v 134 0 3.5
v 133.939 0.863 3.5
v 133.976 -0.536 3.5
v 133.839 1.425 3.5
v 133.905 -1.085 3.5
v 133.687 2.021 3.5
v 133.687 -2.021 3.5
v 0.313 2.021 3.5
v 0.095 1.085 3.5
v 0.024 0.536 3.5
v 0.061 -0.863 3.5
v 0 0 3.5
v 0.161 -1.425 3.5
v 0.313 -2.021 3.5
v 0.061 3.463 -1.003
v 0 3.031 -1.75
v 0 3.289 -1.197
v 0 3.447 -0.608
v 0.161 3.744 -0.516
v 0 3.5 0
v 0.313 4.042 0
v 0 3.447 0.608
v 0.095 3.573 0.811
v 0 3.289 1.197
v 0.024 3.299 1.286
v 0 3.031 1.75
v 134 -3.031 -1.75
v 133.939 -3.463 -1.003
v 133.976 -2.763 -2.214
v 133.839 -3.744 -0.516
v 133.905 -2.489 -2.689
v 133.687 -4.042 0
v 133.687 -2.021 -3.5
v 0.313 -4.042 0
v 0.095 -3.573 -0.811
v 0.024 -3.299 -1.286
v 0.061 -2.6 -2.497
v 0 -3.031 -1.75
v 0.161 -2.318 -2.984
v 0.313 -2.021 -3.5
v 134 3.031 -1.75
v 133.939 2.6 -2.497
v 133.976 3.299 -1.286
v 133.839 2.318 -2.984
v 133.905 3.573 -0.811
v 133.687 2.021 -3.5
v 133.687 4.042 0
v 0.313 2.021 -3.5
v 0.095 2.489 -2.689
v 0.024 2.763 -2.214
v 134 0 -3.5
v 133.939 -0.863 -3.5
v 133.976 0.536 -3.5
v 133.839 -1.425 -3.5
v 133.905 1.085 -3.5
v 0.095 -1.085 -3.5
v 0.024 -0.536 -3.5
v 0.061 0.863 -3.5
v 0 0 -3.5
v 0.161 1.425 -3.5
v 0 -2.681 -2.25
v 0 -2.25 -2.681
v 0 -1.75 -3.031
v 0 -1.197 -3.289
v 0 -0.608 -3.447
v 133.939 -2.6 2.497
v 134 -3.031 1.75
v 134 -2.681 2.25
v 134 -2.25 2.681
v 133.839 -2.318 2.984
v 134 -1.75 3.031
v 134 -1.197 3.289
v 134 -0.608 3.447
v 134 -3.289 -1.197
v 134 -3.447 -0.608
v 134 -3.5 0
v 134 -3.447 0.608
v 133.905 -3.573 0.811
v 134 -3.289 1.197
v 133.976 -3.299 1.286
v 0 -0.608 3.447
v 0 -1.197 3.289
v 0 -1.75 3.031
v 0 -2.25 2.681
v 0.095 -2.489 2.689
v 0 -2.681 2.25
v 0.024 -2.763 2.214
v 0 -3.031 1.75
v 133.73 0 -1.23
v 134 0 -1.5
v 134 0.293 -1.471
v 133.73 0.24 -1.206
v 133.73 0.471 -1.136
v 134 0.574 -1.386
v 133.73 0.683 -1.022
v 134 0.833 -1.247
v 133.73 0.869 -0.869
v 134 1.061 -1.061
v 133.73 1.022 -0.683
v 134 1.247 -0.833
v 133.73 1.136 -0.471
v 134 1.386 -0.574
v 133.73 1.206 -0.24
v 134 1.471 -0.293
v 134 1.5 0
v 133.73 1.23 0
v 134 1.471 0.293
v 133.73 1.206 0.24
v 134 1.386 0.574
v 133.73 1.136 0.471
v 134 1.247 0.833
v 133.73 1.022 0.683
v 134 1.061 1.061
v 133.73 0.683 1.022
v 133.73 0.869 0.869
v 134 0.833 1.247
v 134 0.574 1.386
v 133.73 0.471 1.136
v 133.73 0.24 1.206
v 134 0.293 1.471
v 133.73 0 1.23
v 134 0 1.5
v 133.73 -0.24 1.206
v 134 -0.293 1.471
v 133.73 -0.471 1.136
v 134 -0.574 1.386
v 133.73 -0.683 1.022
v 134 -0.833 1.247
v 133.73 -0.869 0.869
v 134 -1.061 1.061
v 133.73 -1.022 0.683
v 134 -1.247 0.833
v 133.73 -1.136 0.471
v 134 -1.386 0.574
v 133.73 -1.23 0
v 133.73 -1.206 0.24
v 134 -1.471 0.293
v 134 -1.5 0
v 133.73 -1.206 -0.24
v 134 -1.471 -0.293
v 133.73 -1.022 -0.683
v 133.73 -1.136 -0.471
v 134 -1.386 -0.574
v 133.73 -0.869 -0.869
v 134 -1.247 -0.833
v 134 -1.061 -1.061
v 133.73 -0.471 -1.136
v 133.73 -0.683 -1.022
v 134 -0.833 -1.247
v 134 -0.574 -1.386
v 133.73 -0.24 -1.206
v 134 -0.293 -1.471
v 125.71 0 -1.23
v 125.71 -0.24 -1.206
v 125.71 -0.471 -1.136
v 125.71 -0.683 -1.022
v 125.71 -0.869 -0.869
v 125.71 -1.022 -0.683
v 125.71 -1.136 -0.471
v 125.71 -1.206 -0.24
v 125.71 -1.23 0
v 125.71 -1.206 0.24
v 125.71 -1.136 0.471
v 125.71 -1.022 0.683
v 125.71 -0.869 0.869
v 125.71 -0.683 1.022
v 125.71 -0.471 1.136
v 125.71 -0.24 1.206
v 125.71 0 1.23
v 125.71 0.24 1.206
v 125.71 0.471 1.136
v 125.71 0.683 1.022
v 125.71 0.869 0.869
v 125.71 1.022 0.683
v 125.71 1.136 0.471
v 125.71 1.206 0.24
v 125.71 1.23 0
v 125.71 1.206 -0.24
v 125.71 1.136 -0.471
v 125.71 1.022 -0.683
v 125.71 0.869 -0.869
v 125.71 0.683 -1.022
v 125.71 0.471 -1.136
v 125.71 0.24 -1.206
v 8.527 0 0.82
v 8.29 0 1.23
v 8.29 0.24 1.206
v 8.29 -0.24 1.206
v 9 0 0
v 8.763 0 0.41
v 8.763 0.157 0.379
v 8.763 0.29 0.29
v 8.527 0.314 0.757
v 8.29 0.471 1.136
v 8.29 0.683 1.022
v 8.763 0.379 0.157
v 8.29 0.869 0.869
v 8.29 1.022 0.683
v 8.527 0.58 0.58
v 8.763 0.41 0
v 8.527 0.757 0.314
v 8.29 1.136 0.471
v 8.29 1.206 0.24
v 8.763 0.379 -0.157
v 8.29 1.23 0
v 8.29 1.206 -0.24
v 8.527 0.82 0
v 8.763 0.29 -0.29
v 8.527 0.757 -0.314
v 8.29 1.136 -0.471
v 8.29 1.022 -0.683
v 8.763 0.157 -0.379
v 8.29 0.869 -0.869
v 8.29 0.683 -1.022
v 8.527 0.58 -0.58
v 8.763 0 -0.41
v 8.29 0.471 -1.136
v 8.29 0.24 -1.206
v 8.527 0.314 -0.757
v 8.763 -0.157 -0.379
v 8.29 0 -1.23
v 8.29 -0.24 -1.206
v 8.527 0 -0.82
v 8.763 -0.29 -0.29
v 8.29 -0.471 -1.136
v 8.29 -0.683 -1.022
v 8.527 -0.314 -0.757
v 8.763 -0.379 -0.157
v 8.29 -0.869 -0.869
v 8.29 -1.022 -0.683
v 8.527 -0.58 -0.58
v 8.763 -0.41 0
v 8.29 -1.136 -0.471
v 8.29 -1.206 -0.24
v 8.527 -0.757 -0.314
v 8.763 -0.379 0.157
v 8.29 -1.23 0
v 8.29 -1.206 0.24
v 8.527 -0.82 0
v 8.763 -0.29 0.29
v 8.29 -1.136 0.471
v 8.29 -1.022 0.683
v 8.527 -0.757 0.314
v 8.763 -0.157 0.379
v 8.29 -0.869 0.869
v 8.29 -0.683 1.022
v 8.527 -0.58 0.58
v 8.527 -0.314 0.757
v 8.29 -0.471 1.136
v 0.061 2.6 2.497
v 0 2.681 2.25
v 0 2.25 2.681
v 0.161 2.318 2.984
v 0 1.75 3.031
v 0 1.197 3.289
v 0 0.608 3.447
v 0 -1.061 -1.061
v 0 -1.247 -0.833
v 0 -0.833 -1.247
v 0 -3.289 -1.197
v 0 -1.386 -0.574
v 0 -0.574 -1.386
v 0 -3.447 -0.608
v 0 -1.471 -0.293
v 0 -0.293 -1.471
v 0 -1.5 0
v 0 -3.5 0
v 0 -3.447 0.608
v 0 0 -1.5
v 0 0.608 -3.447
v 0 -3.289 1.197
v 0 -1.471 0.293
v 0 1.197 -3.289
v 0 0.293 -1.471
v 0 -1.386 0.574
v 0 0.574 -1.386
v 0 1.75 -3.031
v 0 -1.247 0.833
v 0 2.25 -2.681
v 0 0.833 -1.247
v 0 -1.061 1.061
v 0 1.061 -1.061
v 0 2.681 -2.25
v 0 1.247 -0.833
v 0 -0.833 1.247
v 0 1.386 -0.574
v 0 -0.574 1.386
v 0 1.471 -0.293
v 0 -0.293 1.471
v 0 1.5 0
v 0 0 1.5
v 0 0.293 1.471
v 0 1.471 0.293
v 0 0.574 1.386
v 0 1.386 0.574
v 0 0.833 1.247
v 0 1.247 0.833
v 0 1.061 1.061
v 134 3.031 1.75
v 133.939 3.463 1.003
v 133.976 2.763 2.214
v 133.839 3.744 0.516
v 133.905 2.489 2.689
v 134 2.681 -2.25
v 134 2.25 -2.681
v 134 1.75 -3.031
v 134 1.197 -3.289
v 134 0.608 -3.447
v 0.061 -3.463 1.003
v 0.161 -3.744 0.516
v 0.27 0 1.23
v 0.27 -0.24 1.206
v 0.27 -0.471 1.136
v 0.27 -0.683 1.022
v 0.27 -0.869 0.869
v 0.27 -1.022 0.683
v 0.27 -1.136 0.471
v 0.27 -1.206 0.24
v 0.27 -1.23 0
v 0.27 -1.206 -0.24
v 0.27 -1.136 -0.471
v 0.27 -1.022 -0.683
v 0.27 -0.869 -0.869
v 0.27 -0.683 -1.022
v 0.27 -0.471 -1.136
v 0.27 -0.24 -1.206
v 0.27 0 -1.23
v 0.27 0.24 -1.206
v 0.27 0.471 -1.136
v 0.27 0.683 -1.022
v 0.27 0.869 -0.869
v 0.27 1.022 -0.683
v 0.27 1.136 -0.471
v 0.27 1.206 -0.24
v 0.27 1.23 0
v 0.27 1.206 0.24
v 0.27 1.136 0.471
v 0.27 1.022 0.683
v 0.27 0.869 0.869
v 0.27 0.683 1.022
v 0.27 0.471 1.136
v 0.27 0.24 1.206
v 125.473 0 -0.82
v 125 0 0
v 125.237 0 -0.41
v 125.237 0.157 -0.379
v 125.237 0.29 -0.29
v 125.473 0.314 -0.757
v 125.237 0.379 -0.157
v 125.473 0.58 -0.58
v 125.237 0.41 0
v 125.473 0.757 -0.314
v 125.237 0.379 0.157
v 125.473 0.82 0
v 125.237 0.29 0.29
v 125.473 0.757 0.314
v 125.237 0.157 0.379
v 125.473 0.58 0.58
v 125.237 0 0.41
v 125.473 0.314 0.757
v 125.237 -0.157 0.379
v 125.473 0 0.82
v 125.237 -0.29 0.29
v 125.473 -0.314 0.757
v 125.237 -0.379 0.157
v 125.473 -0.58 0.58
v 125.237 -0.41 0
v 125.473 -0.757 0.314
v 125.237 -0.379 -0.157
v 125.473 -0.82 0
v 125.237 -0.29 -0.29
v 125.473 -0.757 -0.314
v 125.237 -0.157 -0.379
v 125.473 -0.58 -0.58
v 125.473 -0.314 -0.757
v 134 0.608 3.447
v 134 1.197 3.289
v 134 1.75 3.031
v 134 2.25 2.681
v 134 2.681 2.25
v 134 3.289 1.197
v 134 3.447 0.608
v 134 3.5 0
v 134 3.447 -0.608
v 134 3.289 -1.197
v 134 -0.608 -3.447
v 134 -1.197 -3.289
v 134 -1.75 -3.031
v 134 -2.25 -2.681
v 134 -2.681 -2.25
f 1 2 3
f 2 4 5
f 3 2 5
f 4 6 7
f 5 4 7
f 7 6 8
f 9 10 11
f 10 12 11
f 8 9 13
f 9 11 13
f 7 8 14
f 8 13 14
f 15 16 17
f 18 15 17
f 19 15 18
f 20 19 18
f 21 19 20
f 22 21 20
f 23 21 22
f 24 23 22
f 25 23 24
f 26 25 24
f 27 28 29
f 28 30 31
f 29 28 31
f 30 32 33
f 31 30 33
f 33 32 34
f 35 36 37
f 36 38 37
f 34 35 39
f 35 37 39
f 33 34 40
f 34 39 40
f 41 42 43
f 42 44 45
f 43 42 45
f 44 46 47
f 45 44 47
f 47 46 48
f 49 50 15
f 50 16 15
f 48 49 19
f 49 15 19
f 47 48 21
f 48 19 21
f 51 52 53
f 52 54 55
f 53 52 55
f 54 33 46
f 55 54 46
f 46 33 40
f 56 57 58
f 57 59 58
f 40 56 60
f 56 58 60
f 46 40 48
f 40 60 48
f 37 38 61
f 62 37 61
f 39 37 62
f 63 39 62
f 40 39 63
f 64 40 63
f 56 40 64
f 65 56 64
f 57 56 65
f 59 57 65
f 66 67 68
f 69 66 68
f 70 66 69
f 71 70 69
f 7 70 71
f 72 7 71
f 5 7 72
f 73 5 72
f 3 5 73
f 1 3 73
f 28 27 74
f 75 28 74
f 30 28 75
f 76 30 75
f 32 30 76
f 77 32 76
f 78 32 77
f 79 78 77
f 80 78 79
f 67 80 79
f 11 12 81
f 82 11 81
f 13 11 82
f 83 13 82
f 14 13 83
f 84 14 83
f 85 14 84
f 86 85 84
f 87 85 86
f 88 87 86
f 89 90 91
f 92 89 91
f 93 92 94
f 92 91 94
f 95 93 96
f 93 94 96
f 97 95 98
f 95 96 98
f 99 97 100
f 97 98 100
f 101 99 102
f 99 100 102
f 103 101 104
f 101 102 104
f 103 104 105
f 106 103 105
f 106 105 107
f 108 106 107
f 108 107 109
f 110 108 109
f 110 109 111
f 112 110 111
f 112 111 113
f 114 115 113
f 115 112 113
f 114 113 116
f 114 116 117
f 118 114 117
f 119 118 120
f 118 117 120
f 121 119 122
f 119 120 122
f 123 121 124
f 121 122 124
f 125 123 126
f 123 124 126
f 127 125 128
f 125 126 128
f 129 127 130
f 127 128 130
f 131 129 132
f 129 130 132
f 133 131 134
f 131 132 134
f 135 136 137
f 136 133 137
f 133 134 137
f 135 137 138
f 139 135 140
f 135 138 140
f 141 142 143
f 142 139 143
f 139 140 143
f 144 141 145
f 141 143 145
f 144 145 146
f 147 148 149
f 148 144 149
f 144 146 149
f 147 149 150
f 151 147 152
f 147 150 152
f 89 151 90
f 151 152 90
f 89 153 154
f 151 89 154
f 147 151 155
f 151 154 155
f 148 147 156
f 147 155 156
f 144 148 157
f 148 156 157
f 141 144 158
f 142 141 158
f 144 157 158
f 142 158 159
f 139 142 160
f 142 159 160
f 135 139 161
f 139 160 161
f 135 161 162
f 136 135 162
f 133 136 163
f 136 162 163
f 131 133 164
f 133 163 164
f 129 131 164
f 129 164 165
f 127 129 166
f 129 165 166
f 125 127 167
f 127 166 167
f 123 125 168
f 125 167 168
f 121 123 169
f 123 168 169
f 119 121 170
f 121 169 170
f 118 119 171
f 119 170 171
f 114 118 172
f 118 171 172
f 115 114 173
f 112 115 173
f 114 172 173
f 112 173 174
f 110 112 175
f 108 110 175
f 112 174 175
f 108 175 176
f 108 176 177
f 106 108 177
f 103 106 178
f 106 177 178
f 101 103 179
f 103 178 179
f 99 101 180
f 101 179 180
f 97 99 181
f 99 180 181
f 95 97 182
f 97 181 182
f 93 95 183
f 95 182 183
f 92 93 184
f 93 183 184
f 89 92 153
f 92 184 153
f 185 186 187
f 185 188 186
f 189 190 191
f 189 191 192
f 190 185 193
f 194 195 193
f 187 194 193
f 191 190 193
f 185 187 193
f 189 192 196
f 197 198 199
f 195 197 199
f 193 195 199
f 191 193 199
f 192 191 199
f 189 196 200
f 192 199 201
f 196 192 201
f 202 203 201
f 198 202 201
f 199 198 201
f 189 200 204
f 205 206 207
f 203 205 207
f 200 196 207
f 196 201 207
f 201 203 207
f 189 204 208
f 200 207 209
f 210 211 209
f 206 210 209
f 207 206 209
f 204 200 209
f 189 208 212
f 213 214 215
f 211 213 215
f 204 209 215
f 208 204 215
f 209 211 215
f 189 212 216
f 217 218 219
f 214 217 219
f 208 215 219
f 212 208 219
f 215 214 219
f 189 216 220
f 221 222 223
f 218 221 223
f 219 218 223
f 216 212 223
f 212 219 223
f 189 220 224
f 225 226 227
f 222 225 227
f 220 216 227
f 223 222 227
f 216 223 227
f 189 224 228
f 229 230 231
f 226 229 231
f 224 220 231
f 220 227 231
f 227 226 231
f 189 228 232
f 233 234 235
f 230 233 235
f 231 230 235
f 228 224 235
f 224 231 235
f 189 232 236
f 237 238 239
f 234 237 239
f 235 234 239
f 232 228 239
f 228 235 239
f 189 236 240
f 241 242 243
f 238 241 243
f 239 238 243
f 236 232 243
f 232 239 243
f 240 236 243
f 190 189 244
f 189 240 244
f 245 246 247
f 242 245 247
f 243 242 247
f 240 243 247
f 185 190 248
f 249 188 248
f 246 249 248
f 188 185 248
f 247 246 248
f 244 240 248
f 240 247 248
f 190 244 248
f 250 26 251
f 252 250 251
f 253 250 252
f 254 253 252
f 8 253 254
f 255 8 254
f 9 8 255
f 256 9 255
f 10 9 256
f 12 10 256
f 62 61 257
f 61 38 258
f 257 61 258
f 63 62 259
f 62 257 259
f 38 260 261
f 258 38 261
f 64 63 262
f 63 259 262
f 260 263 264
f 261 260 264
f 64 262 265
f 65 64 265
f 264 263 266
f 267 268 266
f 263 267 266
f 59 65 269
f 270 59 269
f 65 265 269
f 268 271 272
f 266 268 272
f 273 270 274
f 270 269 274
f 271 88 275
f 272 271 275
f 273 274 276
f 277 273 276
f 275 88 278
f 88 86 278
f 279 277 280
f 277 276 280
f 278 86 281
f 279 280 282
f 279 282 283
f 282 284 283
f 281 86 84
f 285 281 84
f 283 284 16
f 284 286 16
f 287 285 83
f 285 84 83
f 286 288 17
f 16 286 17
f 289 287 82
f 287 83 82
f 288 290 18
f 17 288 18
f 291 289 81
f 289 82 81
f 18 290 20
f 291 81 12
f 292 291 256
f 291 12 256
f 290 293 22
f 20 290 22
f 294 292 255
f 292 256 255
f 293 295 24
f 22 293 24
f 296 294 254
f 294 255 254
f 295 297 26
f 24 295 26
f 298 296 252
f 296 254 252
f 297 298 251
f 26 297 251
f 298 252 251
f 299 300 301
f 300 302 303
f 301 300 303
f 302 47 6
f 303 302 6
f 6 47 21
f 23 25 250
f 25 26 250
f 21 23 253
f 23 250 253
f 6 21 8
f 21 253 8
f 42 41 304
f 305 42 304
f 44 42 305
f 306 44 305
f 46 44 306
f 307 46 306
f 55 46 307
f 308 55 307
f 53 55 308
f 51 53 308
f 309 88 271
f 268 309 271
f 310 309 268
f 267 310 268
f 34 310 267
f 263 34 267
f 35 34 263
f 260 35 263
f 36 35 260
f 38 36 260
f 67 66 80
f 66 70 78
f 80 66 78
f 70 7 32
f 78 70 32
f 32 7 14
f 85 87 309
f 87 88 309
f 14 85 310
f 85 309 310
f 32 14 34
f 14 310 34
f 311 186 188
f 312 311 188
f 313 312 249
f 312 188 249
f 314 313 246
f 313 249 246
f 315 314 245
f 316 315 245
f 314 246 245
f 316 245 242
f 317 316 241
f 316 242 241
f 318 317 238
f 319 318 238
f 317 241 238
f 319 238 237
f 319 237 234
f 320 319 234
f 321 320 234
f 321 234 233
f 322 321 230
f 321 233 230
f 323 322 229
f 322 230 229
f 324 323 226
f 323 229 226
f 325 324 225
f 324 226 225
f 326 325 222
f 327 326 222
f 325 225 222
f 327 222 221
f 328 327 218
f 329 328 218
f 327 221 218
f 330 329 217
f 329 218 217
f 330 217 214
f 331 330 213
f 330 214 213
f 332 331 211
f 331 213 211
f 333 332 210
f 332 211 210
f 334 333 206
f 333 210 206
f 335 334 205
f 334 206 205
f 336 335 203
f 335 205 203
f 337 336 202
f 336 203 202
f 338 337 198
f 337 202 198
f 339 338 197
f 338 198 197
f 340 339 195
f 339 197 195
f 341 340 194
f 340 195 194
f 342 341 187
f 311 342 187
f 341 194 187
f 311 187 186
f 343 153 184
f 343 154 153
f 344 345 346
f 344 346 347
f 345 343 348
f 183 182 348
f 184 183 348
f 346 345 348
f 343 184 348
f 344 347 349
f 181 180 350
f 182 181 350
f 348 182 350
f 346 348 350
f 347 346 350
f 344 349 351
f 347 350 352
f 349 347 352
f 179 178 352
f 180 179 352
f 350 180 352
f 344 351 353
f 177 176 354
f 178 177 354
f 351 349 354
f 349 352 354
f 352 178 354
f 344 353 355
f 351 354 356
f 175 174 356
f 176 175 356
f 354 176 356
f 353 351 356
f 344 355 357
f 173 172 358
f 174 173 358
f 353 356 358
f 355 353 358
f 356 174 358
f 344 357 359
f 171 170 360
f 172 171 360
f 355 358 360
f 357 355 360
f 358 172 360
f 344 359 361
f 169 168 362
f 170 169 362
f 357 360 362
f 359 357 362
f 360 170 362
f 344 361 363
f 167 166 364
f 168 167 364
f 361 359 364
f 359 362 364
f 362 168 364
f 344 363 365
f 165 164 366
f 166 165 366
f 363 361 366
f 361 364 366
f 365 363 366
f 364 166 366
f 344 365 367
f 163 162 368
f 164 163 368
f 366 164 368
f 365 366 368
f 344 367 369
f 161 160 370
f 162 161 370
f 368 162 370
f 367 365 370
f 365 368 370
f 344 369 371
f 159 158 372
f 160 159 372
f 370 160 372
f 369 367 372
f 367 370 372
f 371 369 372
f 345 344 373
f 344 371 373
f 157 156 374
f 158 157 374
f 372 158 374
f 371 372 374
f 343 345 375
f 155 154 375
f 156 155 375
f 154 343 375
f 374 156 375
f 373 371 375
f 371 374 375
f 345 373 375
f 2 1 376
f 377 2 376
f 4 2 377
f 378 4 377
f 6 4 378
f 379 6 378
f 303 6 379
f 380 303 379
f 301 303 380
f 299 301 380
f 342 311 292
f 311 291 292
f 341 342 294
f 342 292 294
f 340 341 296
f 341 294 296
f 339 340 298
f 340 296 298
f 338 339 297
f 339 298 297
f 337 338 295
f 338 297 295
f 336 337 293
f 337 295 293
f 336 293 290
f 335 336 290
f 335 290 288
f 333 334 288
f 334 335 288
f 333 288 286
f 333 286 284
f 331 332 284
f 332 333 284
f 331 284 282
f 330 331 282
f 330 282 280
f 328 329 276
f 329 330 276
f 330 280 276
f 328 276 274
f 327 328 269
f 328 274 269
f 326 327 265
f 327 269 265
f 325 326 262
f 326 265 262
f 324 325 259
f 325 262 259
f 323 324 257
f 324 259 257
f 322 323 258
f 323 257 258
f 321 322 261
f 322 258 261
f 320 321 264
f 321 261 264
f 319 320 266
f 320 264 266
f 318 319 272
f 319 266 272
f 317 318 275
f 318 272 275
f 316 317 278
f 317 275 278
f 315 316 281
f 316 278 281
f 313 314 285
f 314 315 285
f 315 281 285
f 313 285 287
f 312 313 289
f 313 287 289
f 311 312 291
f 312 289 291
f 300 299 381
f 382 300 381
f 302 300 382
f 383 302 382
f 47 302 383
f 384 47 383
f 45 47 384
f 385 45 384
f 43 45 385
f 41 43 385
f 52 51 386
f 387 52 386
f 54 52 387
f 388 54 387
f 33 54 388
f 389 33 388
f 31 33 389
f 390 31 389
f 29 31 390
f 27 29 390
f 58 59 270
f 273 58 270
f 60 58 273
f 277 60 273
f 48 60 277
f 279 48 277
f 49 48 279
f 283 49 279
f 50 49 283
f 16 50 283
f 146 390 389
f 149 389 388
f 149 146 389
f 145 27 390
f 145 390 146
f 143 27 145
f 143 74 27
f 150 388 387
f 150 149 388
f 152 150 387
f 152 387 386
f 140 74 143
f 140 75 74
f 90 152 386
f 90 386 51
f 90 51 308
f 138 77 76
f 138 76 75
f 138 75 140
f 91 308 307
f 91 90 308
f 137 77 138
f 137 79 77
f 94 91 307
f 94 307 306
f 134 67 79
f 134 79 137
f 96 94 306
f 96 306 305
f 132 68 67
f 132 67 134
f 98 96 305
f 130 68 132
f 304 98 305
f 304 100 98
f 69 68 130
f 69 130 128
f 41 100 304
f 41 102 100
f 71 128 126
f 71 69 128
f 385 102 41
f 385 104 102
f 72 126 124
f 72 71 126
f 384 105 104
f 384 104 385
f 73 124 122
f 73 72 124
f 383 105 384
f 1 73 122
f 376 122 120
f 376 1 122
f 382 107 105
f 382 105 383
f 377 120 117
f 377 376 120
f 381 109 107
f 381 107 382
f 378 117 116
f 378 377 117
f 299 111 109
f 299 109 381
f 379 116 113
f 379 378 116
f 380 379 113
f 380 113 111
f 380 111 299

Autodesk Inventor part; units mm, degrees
sketch "Sketch_1" plane through (0, 0, 0) normal (0, 0, 1) x (1, 0, 0)
  line L0 (134, 0) -> (0, 0)
  line L1 (0, 0) -> (0, 3.5)
  line L2 (0, 3.5) -> (0.6062, 4.55)
  line L3 (0.6062, 4.55) -> (133.3938, 4.55)
  line L4 (133.3938, 4.55) -> (134, 3.5)
  line L5 (134, 3.5) -> (134, 0)
  line L6 (134, 0) -> (0, 0)
revolve "Revolution1" add sketch "Sketch_1" angle 360 about axis through (134, 0, 0) along (1, 0, 0)
sketch "Sketch_2" plane through (0, 0, 0) normal (1, 0, 0) x (0, 1, 0)
  line L0 (7, 7) -> (-7, 7)
  line L1 (-7, 7) -> (-7, -7)
  line L2 (-7, -7) -> (7, -7)
  line L3 (7, -7) -> (7, 7)
  line L4 (-2.0207, 3.5) -> (-4.0415, 0)
  line L5 (-4.0415, 0) -> (-2.0207, -3.5)
  line L6 (-2.0207, -3.5) -> (2.0207, -3.5)
  line L7 (2.0207, -3.5) -> (4.0415, 0)
  line L8 (4.0415, 0) -> (2.0207, 3.5)
  line L9 (2.0207, 3.5) -> (-2.0207, 3.5)
extrude "Extrusion1" cut sketch "Sketch_2" along normal blind 134
sketch "Sketch3" plane through (0, 0, 0) normal (-1, 0, 0) x (0, 0, 1)
  point P0 (0, 0)
hole "Hole1" at (0, 0, 0) direction (1, 0, 0) diameter 2.459 depth 8.2901 tip angle 120 countersink diameter 3 countersink angle 90 thread size "M3x0.5" class "6H" standard "ISO Metric profile"
sketch "Sketch4" plane through (134, 0, 0) normal (1, 0, 0) x (0, 0, -1)
  point P0 (0, 0)
hole "Hole2" at (134, 0, 0) direction (-1, 0, 0) diameter 2.459 depth 8.2901 tip angle 120 countersink diameter 3 countersink angle 90 thread size "M3x0.5" class "6H" standard "ISO Metric profile"
ref_plane "C3_XY" through (134, 0, 0) normal (-1, 0, 0) x (0, 0, -1)
ref_plane "C3_YZ" through (134, 0, 0) normal (0, 0, -1) x (0, -1, 0)
ref_plane "C3_ZX" through (134, 0, 0) normal (0, -1, 0) x (-1, 0, 0)
properties part number "SLSBF7-134-M3-N3"
